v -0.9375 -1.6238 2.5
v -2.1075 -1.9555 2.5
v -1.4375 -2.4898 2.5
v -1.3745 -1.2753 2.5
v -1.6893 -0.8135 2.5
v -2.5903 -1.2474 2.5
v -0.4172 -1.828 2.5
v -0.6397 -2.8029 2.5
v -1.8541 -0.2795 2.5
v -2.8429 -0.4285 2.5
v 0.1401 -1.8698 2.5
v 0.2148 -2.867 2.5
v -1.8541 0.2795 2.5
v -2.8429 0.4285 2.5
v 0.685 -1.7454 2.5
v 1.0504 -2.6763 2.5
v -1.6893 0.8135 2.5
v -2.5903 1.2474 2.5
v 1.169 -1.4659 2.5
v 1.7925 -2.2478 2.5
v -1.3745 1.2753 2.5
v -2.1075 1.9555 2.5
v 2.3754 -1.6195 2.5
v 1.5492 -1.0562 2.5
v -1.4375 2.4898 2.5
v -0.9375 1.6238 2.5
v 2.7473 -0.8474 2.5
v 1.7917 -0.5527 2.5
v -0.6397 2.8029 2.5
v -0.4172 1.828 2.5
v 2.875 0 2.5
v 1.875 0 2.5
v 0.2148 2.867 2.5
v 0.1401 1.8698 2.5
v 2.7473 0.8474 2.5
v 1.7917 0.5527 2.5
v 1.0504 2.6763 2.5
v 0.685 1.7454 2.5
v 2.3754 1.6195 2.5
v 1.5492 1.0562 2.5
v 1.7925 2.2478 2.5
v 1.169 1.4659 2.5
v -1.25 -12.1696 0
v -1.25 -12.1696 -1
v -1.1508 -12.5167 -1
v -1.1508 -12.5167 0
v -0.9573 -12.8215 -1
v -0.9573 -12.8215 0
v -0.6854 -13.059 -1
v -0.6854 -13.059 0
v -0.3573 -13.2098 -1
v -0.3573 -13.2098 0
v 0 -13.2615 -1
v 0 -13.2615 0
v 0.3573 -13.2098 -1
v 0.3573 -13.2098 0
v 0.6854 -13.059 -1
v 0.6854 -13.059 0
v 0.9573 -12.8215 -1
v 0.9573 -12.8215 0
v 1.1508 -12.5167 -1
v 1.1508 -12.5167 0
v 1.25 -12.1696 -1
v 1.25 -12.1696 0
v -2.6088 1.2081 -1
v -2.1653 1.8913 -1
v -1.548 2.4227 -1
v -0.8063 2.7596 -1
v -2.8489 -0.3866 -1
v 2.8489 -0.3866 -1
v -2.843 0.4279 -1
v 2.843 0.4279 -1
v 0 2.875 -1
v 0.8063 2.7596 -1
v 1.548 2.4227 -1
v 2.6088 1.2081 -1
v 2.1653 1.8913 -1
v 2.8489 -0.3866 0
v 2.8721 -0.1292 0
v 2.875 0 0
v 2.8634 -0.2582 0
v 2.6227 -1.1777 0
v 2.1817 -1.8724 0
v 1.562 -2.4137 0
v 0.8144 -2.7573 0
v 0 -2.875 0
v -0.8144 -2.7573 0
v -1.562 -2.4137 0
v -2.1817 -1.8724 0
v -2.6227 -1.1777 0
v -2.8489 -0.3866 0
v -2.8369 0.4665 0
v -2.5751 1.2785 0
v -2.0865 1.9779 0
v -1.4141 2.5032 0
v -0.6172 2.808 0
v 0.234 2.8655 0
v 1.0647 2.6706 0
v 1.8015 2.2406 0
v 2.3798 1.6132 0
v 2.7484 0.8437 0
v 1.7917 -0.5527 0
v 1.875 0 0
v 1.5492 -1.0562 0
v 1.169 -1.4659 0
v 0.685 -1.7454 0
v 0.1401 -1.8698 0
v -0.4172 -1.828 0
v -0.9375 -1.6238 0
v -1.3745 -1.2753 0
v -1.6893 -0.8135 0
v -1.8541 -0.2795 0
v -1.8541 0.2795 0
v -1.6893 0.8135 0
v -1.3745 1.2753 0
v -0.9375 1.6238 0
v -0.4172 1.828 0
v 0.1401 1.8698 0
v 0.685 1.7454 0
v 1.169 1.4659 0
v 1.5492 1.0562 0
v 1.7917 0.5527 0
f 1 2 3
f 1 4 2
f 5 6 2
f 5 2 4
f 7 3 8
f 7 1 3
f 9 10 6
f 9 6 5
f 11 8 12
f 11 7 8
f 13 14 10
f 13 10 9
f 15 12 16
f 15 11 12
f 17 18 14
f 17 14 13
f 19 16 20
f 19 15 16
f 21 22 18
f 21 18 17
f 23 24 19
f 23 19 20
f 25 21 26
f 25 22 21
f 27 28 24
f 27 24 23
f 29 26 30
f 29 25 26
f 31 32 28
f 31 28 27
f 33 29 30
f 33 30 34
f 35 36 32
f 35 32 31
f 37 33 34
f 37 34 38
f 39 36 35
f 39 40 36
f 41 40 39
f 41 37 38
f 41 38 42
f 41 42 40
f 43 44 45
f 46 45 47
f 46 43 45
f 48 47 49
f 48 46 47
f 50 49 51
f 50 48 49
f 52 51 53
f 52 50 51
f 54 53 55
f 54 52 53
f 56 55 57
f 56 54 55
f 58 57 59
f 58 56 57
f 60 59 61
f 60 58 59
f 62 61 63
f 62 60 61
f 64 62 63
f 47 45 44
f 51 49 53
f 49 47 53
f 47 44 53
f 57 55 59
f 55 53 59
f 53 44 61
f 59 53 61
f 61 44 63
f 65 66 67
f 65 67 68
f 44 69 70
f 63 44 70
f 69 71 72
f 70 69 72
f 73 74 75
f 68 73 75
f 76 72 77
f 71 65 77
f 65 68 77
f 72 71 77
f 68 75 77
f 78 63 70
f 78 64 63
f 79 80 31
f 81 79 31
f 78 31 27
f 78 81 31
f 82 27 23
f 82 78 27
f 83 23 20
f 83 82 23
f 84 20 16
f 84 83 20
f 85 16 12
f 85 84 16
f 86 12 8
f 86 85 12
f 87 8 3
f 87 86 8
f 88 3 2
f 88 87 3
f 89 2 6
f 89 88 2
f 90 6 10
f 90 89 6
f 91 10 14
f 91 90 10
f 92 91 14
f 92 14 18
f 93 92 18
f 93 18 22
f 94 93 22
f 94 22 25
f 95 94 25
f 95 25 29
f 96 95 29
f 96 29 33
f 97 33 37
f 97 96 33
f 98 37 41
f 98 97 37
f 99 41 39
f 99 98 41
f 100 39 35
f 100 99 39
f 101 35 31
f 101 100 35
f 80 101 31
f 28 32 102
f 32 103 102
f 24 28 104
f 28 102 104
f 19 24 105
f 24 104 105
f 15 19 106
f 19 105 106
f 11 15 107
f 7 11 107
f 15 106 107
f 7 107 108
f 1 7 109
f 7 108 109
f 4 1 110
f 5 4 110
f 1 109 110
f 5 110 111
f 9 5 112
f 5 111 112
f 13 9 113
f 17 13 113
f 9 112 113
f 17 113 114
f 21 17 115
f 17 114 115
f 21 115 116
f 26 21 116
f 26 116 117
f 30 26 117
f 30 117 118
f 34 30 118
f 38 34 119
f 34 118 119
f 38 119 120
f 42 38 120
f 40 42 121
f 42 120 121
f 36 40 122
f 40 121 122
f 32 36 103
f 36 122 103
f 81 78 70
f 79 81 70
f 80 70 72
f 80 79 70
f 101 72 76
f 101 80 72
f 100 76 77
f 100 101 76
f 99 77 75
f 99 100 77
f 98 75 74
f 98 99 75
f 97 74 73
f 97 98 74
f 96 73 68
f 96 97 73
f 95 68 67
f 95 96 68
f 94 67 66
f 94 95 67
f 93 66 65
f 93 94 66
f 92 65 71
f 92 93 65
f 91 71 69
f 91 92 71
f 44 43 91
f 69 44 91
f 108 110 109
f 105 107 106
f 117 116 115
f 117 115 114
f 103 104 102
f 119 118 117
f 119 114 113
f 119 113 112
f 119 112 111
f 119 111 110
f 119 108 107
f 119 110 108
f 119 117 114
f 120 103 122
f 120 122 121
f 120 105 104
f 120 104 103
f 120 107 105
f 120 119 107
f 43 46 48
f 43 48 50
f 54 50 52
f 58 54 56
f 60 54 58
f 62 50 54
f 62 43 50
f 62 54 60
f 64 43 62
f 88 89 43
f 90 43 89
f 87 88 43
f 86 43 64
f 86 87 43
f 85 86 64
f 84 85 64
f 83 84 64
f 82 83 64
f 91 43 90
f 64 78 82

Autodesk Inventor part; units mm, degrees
ref_plane "YZ Plane" through (0, 0, 0) normal (1, 0, 0) x (0, 1, 0)
ref_plane "XZ Plane" through (0, 0, 0) normal (0, 1, 0) x (-1, 0, 0)
ref_plane "XY Plane" through (0, 0, 0) normal (0, 0, 1) x (1, 0, 0)
sketch "Sketch1" plane through (0, 0, 0) normal (0, 0, 1) x (1, 0, 0)
  circle A0 centre (0, 0) radius 1.875
  circle A1 centre (0, 0) radius 2.875
  line L0 (-2.8489, -0.3866) -> (0, -21.3815) construction
  line L1 (0, -21.3815) -> (2.8489, -0.3866) construction
  line L2 (0, -26.2328) -> (0, 7.7263) projected
  line L3 (-4.025, 0) -> (4.025, 0) projected
  arc A2 (-1.25, -12.1696) -> (1.25, -12.1696) centre (0, -12) ccw
  line L4 (-1.25, -12.1696) -> (-2.8489, -0.3866)
  line L5 (1.25, -12.1696) -> (2.8489, -0.3866)
  dimension "d0" = 3.75
  dimension "d1" = 1
  dimension "d2" = 12
  dimension "d3" = 2.5
extrude "Extrusion1" add sketch "Sketch1" against normal blind 1
extrude "Extrusion2" add sketch "Sketch1" along normal blind 2.5 contours L3 A1 L2 A0 | A0 L2 A1 L3 | A0 L3 A1 L2 | L2 A1 L3 A0
properties part number "empty"
